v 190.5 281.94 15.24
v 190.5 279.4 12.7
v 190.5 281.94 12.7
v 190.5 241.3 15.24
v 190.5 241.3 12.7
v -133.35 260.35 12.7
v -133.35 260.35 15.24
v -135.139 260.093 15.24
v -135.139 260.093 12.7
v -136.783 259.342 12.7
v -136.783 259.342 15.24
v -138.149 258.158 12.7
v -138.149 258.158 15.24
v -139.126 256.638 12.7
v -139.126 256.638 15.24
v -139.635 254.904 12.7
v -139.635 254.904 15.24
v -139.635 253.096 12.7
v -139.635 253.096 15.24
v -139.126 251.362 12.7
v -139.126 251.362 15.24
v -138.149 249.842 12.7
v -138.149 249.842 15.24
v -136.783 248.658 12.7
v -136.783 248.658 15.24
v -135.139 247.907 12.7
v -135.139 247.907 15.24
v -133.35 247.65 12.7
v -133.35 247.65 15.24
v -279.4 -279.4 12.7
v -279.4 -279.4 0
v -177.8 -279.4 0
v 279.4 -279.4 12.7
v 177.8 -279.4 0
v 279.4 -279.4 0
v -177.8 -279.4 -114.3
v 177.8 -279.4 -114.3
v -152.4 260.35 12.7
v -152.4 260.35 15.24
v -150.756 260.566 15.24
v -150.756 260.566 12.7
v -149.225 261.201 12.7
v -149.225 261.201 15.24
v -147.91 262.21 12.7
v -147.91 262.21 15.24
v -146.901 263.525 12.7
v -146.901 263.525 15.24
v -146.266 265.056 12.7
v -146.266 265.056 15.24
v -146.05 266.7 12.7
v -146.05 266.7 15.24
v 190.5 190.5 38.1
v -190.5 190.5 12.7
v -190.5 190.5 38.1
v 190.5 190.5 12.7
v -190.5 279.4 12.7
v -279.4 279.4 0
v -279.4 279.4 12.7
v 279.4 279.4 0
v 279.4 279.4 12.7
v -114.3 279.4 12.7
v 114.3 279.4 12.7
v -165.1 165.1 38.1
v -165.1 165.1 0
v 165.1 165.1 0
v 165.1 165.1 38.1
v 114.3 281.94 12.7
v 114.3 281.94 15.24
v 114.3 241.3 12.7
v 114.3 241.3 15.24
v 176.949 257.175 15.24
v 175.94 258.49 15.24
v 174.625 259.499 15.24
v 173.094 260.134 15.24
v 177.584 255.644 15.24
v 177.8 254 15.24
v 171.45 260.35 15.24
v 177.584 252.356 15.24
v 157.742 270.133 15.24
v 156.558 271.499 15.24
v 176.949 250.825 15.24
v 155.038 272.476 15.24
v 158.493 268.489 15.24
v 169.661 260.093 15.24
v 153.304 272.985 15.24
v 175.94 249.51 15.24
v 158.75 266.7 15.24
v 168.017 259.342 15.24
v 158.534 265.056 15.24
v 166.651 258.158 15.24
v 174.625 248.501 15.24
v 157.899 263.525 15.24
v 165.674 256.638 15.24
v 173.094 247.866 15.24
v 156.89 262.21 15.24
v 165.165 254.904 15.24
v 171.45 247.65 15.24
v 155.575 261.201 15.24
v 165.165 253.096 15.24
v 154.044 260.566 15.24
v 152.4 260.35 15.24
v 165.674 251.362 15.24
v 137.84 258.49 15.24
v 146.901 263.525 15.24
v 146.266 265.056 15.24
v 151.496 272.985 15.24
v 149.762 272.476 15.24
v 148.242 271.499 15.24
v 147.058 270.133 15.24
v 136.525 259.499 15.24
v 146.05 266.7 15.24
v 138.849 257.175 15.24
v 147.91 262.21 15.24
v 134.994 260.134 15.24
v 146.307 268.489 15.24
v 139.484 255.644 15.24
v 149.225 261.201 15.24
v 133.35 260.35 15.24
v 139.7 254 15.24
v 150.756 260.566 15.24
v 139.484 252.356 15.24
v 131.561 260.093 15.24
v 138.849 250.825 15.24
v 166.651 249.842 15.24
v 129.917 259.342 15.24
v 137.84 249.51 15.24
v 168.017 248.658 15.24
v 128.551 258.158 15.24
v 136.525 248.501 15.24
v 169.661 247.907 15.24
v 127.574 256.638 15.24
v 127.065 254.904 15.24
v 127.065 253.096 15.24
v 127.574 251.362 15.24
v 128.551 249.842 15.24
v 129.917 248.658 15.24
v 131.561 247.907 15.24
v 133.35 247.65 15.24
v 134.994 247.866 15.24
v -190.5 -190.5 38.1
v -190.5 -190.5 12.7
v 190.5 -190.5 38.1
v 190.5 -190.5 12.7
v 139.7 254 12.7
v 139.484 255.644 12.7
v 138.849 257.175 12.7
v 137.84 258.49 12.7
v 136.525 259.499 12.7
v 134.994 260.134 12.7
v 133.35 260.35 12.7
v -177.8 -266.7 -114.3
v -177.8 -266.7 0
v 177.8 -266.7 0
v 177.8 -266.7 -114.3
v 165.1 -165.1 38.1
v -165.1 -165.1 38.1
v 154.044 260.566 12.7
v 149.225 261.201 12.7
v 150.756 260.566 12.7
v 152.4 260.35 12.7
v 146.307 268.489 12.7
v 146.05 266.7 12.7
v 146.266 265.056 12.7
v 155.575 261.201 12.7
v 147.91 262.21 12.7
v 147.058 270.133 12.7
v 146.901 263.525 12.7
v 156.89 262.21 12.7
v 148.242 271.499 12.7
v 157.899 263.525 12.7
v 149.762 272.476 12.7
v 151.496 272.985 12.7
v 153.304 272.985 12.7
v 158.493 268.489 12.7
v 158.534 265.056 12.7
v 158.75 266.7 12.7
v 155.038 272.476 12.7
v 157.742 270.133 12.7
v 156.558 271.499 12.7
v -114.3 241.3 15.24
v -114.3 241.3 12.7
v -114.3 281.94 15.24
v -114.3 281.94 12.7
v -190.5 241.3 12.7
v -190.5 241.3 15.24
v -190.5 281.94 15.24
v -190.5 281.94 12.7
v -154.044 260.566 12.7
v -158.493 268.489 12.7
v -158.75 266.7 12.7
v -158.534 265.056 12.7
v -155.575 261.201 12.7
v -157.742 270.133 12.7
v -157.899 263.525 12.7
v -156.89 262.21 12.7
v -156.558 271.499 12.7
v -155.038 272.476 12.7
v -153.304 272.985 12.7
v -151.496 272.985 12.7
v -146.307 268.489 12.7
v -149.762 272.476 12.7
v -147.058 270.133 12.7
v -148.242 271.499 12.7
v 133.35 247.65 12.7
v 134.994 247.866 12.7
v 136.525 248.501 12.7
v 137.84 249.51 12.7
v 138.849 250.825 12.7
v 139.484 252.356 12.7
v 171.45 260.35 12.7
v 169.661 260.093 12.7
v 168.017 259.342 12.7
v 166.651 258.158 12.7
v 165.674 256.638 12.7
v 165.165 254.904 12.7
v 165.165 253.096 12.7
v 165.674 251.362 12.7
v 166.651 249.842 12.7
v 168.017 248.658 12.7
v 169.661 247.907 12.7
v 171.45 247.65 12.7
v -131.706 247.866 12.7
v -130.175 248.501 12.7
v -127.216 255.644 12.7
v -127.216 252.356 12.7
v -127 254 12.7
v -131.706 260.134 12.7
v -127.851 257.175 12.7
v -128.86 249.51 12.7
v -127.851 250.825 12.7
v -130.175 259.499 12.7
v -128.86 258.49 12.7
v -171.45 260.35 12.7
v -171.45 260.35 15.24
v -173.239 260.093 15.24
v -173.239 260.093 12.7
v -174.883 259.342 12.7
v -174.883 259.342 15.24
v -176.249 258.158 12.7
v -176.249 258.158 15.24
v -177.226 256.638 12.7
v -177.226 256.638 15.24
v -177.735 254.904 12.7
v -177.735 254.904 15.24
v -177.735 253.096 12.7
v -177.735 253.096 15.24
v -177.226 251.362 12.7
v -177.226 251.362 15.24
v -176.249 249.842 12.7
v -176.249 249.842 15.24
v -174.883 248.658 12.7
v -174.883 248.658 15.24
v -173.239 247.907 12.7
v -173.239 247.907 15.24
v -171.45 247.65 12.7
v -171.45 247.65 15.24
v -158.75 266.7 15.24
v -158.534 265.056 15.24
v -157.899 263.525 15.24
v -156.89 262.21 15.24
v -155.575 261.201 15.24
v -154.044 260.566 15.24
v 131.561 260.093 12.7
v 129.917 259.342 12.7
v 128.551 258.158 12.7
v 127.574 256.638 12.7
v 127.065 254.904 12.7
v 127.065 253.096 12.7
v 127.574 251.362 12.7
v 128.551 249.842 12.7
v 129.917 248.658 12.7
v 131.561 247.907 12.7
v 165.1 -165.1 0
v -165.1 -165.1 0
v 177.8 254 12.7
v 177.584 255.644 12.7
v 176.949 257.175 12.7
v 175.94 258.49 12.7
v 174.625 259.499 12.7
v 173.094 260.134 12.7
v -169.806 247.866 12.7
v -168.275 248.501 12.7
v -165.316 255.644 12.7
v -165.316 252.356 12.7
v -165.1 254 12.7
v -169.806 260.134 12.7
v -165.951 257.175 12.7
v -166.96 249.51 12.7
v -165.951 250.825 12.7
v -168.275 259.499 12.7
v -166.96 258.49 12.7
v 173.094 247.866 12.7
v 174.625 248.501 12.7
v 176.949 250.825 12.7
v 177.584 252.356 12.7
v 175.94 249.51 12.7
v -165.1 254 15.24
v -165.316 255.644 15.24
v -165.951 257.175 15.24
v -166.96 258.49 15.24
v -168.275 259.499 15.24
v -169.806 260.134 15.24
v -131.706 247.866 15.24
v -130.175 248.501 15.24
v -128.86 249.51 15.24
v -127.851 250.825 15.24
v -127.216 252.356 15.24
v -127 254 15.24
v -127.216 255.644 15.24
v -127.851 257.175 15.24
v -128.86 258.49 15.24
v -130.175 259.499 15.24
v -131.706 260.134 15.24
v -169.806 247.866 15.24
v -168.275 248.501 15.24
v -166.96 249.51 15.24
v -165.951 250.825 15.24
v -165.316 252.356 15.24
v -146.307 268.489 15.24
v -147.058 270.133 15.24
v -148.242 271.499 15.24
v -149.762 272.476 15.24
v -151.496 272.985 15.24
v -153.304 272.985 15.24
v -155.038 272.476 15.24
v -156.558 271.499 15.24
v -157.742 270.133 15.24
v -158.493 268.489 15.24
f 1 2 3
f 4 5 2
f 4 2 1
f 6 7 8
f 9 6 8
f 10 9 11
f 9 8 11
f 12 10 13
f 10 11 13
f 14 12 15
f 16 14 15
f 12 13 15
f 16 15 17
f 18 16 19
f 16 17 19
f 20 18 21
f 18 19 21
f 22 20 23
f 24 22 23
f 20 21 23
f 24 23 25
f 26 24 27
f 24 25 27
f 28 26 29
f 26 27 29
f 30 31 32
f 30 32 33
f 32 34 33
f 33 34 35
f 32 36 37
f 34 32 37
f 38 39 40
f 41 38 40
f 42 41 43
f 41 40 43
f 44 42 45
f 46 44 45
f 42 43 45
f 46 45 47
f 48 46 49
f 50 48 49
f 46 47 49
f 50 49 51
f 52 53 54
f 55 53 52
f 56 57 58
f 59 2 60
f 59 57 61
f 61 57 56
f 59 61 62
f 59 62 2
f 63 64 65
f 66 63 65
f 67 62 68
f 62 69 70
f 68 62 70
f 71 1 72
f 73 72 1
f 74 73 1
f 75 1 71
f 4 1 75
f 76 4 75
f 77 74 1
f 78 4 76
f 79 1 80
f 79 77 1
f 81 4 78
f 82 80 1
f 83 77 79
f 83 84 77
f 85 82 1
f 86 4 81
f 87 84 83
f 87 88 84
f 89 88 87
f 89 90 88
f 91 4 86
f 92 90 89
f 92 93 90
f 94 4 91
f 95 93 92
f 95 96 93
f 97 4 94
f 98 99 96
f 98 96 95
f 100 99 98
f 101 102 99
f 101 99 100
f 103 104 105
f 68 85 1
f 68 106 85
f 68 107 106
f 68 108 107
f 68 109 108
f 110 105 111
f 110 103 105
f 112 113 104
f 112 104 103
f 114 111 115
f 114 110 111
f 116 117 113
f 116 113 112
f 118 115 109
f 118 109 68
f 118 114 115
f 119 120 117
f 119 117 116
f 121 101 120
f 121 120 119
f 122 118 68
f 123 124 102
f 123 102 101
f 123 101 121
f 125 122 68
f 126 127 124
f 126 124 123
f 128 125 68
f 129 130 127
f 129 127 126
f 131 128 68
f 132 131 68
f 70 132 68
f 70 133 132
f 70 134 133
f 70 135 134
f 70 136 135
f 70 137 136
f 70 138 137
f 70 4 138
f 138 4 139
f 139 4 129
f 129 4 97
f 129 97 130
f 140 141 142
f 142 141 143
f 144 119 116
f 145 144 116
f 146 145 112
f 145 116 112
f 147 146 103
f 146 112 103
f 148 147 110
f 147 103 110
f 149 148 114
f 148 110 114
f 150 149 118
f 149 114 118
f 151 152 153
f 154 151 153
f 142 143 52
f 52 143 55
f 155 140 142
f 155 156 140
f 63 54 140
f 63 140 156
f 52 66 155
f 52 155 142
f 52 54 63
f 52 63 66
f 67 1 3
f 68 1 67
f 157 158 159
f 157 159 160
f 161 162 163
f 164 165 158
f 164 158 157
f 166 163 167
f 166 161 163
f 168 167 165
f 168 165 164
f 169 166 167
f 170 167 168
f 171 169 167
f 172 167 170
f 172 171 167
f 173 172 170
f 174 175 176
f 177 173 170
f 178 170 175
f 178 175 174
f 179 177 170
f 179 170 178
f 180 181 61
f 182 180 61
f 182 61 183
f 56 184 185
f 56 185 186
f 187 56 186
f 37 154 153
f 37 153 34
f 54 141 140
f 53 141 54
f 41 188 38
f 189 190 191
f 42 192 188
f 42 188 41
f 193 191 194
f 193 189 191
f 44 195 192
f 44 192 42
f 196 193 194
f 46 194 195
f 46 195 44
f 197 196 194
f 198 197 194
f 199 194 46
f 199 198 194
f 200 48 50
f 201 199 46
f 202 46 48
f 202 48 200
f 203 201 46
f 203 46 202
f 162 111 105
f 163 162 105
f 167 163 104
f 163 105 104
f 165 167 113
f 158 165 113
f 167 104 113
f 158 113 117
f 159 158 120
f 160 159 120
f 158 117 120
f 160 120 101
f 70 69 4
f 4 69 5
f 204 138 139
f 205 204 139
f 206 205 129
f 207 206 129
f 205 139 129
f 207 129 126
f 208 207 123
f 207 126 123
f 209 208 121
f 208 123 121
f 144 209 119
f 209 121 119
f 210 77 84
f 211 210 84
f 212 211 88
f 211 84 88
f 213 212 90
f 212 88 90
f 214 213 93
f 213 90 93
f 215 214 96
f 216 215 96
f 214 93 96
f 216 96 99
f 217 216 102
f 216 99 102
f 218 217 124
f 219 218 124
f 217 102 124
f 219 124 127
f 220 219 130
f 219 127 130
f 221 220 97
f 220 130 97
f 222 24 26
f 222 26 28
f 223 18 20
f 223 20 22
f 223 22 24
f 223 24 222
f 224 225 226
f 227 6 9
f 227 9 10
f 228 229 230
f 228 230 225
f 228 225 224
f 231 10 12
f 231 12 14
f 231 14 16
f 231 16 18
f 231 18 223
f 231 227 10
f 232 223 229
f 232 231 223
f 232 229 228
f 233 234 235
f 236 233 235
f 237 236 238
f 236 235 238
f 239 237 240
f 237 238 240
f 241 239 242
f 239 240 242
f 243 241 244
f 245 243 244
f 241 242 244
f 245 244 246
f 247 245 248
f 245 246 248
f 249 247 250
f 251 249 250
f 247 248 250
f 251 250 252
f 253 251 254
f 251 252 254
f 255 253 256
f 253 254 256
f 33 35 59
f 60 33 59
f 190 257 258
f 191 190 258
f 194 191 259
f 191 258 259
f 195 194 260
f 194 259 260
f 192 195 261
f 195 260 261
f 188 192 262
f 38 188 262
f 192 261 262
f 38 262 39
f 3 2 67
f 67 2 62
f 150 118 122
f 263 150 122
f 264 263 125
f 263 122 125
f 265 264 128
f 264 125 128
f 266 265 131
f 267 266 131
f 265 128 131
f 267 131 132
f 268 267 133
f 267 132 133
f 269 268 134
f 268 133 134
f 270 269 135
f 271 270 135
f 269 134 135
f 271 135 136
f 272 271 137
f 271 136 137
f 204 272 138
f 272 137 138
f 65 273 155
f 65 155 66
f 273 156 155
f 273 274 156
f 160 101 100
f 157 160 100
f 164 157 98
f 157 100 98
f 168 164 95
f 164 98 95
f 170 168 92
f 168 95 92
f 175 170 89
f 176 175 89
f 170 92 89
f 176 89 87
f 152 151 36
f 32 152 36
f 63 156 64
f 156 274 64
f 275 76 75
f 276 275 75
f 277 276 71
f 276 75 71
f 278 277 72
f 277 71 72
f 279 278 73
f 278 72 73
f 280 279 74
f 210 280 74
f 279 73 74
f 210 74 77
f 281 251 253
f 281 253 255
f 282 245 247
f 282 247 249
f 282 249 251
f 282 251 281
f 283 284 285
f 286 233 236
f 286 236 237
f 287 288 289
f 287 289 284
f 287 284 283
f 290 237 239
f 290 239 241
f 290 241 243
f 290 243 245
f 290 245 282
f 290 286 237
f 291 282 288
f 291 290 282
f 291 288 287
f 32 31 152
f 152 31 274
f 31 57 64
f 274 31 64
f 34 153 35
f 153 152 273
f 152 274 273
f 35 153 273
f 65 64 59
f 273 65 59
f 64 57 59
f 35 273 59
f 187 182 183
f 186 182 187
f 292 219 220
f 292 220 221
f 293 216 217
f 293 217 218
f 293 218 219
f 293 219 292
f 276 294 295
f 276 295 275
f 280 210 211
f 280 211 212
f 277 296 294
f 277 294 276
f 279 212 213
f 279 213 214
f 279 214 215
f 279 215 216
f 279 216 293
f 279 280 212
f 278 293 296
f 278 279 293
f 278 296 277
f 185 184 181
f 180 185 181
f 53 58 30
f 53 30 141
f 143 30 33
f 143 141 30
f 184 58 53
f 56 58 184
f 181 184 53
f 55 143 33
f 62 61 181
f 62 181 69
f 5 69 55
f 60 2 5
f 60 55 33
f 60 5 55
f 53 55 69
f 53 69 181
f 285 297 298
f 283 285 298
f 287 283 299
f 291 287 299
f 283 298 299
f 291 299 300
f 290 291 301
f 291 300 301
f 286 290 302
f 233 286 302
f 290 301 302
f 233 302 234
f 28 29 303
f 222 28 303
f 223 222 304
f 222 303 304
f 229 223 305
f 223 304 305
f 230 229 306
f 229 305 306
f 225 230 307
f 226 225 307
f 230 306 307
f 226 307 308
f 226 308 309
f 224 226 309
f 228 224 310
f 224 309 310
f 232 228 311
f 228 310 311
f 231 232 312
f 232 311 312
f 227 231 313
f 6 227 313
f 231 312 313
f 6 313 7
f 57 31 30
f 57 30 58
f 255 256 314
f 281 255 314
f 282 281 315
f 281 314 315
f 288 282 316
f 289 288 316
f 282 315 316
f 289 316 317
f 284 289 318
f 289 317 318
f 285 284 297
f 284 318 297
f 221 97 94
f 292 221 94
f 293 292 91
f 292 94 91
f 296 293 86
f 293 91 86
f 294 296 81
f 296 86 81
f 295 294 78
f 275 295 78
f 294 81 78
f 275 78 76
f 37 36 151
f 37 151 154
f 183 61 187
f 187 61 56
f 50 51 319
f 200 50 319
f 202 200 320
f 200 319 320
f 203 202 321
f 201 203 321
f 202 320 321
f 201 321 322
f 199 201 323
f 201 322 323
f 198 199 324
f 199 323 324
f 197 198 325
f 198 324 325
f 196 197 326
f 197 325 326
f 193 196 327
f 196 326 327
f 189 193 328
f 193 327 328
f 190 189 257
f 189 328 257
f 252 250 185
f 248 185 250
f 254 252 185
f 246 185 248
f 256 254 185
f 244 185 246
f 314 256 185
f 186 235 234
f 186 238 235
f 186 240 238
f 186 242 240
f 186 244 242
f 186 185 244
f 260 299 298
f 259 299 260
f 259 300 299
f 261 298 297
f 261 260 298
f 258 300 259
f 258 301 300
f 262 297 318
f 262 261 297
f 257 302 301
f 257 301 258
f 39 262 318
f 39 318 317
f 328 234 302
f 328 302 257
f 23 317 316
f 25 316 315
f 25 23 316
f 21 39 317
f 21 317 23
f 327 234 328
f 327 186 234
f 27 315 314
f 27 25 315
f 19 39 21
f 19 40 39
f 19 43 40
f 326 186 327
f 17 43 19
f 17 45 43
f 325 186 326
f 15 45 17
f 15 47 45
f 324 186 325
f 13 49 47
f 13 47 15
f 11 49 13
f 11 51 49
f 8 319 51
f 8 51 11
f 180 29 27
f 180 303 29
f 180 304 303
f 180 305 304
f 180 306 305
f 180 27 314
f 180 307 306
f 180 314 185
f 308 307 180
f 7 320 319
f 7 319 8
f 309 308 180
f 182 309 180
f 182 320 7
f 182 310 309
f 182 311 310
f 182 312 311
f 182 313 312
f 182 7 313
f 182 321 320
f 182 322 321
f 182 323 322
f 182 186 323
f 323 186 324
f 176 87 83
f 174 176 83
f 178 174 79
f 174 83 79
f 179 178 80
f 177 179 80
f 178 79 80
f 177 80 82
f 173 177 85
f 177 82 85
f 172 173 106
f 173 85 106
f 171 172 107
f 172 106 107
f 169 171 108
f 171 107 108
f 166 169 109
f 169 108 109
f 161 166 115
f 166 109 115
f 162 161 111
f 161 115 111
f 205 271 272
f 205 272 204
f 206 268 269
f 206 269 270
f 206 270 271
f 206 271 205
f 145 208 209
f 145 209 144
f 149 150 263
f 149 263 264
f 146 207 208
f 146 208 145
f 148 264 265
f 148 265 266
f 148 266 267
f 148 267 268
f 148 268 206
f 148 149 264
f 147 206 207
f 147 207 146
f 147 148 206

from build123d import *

# Parameters (mm, degrees)
F0_W      = 558.8
F0_H      = 558.8
F1_DEPTH  = 12.7
F2_W      = 355.6
F2_H      = 12.7
F3_DEPTH  = 114.3
F4_W      = 330.2
F4_H      = 330.2
F5_DEPTH  = 25.4
F6_W      = 381
F6_H      = 381
F6_W_2    = 330.2
F6_H_2    = 330.2
F7_DEPTH  = 25.4
F8_W      = 76.2
F8_H      = 38.1
F9_DEPTH  = 2.54
F10_W     = 76.2
F10_H     = 2.54
F11_DEPTH = 2.54
F13_DEPTH = 2.54
F15_DEPTH = 2.54


with BuildPart() as f1:
    # F0 (on Top) → F1 (new body)
    with BuildSketch(Plane.XY):
        Rectangle(F0_W, F0_H)
    extrude(amount=F1_DEPTH)

    # F2 (on face) → F3 (join)
    with BuildSketch(Plane(origin=(0, 0, 0), x_dir=(1, 0, 0), z_dir=(0, 0, -1))):
        with Locations((0, 273.05)):
            Rectangle(F2_W, F2_H)
    extrude(amount=F3_DEPTH)

    # F4 (on face) → F5 (cut)
    with BuildSketch(Plane.XY.offset(12.7)):
        Rectangle(F4_W, F4_H)
    extrude(amount=-F5_DEPTH, mode=Mode.SUBTRACT)

    # F6 (on face) → F7 (join)
    with BuildSketch(Plane.XY.offset(12.7)):
        Rectangle(F6_W, F6_H)
        Rectangle(F6_W_2, F6_H_2, mode=Mode.SUBTRACT)
    extrude(amount=F7_DEPTH)

    # F8 (on face) → F9 (join)
    with BuildSketch(Plane.XY.offset(12.7)):
        with Locations((-152.4, 260.35)):
            Rectangle(F8_W, F8_H)
        with Locations((152.4, 260.35)):
            Rectangle(F8_W, F8_H)
    extrude(amount=F9_DEPTH)

    # F10 (on face) → F11 (join)
    with BuildSketch(Plane(origin=(0, 279.4, 0), x_dir=(-1, 0, 0), z_dir=(0, 1, 0))):
        with Locations((-152.4, 13.97)):
            Rectangle(F10_W, F10_H)
        with Locations((152.4, 13.97)):
            Rectangle(F10_W, F10_H)
    extrude(amount=F11_DEPTH)

    # F12 (on face) → F13 (cut)
    with BuildSketch(Plane.XY.offset(15.24)):
        with BuildLine():
            Line((-158.75, 266.7), (-152.4, 266.7))
            Line((-152.4, 266.7), (-146.05, 266.7))
            ThreePointArc((-146.05, 266.7), (-152.4, 273.05), (-158.75, 266.7))
        make_face()
        with BuildLine():
            ThreePointArc((-158.75, 266.7), (-156.8901280605, 262.2098719395), (-152.4, 260.35))
            Line((-152.4, 260.35), (-152.4, 266.7))
            Line((-152.4, 266.7), (-158.75, 266.7))
        make_face()
        with BuildLine():
            Line((-152.4, 266.7), (-152.4, 260.35))
            ThreePointArc((-152.4, 260.35), (-147.9098719395, 262.2098719395), (-146.05, 266.7))
            Line((-146.05, 266.7), (-152.4, 266.7))
        make_face()
        with BuildLine():
            ThreePointArc((-171.45, 260.35), (-177.8, 254), (-171.45, 247.65))
            Line((-171.45, 247.65), (-171.45, 260.35))
        make_face()
        with BuildLine():
            Line((-171.45, 260.35), (-171.45, 247.65))
            ThreePointArc((-171.45, 247.65), (-166.9598719395, 249.5098719395), (-165.1, 254))
            ThreePointArc((-165.1, 254), (-166.9598719395, 258.4901280605), (-171.45, 260.35))
        make_face()
        with BuildLine():
            ThreePointArc((-133.35, 260.35), (-139.7, 254), (-133.35, 247.65))
            Line((-133.35, 247.65), (-133.35, 260.35))
        make_face()
        with BuildLine():
            Line((-133.35, 260.35), (-133.35, 247.65))
            ThreePointArc((-133.35, 247.65), (-128.8598719395, 249.5098719395), (-127, 254))
            ThreePointArc((-127, 254), (-128.8598719395, 258.4901280605), (-133.35, 260.35))
        make_face()
    extrude(amount=-F13_DEPTH, mode=Mode.SUBTRACT)

    # F14 (on face) → F15 (cut)
    with BuildSketch(Plane.XY.offset(15.24)):
        with BuildLine():
            Line((146.05, 266.7), (152.4, 266.7))
            Line((152.4, 266.7), (158.75, 266.7))
            ThreePointArc((158.75, 266.7), (152.4, 273.05), (146.05, 266.7))
        make_face()
        with BuildLine():
            ThreePointArc((146.05, 266.7), (147.9098719395, 262.2098719395), (152.4, 260.35))
            Line((152.4, 260.35), (152.4, 266.7))
            Line((152.4, 266.7), (146.05, 266.7))
        make_face()
        with BuildLine():
            Line((152.4, 266.7), (152.4, 260.35))
            ThreePointArc((152.4, 260.35), (156.8901280605, 262.2098719395), (158.75, 266.7))
            Line((158.75, 266.7), (152.4, 266.7))
        make_face()
        with BuildLine():
            ThreePointArc((171.45, 260.35), (165.1, 254), (171.45, 247.65))
            Line((171.45, 247.65), (171.45, 260.35))
        make_face()
        with BuildLine():
            Line((171.45, 260.35), (171.45, 247.65))
            ThreePointArc((171.45, 247.65), (175.9401280605, 249.5098719395), (177.8, 254))
            ThreePointArc((177.8, 254), (175.9401280605, 258.4901280605), (171.45, 260.35))
        make_face()
        with BuildLine():
            Line((133.35, 260.35), (133.35, 247.65))
            ThreePointArc((133.35, 247.65), (137.8401280605, 249.5098719395), (139.7, 254))
            ThreePointArc((139.7, 254), (137.8401280605, 258.4901280605), (133.35, 260.35))
        make_face()
        with BuildLine():
            ThreePointArc((133.35, 260.35), (127, 254), (133.35, 247.65))
            Line((133.35, 247.65), (133.35, 260.35))
        make_face()
    extrude(amount=-F15_DEPTH, mode=Mode.SUBTRACT)


solid = f1.part
